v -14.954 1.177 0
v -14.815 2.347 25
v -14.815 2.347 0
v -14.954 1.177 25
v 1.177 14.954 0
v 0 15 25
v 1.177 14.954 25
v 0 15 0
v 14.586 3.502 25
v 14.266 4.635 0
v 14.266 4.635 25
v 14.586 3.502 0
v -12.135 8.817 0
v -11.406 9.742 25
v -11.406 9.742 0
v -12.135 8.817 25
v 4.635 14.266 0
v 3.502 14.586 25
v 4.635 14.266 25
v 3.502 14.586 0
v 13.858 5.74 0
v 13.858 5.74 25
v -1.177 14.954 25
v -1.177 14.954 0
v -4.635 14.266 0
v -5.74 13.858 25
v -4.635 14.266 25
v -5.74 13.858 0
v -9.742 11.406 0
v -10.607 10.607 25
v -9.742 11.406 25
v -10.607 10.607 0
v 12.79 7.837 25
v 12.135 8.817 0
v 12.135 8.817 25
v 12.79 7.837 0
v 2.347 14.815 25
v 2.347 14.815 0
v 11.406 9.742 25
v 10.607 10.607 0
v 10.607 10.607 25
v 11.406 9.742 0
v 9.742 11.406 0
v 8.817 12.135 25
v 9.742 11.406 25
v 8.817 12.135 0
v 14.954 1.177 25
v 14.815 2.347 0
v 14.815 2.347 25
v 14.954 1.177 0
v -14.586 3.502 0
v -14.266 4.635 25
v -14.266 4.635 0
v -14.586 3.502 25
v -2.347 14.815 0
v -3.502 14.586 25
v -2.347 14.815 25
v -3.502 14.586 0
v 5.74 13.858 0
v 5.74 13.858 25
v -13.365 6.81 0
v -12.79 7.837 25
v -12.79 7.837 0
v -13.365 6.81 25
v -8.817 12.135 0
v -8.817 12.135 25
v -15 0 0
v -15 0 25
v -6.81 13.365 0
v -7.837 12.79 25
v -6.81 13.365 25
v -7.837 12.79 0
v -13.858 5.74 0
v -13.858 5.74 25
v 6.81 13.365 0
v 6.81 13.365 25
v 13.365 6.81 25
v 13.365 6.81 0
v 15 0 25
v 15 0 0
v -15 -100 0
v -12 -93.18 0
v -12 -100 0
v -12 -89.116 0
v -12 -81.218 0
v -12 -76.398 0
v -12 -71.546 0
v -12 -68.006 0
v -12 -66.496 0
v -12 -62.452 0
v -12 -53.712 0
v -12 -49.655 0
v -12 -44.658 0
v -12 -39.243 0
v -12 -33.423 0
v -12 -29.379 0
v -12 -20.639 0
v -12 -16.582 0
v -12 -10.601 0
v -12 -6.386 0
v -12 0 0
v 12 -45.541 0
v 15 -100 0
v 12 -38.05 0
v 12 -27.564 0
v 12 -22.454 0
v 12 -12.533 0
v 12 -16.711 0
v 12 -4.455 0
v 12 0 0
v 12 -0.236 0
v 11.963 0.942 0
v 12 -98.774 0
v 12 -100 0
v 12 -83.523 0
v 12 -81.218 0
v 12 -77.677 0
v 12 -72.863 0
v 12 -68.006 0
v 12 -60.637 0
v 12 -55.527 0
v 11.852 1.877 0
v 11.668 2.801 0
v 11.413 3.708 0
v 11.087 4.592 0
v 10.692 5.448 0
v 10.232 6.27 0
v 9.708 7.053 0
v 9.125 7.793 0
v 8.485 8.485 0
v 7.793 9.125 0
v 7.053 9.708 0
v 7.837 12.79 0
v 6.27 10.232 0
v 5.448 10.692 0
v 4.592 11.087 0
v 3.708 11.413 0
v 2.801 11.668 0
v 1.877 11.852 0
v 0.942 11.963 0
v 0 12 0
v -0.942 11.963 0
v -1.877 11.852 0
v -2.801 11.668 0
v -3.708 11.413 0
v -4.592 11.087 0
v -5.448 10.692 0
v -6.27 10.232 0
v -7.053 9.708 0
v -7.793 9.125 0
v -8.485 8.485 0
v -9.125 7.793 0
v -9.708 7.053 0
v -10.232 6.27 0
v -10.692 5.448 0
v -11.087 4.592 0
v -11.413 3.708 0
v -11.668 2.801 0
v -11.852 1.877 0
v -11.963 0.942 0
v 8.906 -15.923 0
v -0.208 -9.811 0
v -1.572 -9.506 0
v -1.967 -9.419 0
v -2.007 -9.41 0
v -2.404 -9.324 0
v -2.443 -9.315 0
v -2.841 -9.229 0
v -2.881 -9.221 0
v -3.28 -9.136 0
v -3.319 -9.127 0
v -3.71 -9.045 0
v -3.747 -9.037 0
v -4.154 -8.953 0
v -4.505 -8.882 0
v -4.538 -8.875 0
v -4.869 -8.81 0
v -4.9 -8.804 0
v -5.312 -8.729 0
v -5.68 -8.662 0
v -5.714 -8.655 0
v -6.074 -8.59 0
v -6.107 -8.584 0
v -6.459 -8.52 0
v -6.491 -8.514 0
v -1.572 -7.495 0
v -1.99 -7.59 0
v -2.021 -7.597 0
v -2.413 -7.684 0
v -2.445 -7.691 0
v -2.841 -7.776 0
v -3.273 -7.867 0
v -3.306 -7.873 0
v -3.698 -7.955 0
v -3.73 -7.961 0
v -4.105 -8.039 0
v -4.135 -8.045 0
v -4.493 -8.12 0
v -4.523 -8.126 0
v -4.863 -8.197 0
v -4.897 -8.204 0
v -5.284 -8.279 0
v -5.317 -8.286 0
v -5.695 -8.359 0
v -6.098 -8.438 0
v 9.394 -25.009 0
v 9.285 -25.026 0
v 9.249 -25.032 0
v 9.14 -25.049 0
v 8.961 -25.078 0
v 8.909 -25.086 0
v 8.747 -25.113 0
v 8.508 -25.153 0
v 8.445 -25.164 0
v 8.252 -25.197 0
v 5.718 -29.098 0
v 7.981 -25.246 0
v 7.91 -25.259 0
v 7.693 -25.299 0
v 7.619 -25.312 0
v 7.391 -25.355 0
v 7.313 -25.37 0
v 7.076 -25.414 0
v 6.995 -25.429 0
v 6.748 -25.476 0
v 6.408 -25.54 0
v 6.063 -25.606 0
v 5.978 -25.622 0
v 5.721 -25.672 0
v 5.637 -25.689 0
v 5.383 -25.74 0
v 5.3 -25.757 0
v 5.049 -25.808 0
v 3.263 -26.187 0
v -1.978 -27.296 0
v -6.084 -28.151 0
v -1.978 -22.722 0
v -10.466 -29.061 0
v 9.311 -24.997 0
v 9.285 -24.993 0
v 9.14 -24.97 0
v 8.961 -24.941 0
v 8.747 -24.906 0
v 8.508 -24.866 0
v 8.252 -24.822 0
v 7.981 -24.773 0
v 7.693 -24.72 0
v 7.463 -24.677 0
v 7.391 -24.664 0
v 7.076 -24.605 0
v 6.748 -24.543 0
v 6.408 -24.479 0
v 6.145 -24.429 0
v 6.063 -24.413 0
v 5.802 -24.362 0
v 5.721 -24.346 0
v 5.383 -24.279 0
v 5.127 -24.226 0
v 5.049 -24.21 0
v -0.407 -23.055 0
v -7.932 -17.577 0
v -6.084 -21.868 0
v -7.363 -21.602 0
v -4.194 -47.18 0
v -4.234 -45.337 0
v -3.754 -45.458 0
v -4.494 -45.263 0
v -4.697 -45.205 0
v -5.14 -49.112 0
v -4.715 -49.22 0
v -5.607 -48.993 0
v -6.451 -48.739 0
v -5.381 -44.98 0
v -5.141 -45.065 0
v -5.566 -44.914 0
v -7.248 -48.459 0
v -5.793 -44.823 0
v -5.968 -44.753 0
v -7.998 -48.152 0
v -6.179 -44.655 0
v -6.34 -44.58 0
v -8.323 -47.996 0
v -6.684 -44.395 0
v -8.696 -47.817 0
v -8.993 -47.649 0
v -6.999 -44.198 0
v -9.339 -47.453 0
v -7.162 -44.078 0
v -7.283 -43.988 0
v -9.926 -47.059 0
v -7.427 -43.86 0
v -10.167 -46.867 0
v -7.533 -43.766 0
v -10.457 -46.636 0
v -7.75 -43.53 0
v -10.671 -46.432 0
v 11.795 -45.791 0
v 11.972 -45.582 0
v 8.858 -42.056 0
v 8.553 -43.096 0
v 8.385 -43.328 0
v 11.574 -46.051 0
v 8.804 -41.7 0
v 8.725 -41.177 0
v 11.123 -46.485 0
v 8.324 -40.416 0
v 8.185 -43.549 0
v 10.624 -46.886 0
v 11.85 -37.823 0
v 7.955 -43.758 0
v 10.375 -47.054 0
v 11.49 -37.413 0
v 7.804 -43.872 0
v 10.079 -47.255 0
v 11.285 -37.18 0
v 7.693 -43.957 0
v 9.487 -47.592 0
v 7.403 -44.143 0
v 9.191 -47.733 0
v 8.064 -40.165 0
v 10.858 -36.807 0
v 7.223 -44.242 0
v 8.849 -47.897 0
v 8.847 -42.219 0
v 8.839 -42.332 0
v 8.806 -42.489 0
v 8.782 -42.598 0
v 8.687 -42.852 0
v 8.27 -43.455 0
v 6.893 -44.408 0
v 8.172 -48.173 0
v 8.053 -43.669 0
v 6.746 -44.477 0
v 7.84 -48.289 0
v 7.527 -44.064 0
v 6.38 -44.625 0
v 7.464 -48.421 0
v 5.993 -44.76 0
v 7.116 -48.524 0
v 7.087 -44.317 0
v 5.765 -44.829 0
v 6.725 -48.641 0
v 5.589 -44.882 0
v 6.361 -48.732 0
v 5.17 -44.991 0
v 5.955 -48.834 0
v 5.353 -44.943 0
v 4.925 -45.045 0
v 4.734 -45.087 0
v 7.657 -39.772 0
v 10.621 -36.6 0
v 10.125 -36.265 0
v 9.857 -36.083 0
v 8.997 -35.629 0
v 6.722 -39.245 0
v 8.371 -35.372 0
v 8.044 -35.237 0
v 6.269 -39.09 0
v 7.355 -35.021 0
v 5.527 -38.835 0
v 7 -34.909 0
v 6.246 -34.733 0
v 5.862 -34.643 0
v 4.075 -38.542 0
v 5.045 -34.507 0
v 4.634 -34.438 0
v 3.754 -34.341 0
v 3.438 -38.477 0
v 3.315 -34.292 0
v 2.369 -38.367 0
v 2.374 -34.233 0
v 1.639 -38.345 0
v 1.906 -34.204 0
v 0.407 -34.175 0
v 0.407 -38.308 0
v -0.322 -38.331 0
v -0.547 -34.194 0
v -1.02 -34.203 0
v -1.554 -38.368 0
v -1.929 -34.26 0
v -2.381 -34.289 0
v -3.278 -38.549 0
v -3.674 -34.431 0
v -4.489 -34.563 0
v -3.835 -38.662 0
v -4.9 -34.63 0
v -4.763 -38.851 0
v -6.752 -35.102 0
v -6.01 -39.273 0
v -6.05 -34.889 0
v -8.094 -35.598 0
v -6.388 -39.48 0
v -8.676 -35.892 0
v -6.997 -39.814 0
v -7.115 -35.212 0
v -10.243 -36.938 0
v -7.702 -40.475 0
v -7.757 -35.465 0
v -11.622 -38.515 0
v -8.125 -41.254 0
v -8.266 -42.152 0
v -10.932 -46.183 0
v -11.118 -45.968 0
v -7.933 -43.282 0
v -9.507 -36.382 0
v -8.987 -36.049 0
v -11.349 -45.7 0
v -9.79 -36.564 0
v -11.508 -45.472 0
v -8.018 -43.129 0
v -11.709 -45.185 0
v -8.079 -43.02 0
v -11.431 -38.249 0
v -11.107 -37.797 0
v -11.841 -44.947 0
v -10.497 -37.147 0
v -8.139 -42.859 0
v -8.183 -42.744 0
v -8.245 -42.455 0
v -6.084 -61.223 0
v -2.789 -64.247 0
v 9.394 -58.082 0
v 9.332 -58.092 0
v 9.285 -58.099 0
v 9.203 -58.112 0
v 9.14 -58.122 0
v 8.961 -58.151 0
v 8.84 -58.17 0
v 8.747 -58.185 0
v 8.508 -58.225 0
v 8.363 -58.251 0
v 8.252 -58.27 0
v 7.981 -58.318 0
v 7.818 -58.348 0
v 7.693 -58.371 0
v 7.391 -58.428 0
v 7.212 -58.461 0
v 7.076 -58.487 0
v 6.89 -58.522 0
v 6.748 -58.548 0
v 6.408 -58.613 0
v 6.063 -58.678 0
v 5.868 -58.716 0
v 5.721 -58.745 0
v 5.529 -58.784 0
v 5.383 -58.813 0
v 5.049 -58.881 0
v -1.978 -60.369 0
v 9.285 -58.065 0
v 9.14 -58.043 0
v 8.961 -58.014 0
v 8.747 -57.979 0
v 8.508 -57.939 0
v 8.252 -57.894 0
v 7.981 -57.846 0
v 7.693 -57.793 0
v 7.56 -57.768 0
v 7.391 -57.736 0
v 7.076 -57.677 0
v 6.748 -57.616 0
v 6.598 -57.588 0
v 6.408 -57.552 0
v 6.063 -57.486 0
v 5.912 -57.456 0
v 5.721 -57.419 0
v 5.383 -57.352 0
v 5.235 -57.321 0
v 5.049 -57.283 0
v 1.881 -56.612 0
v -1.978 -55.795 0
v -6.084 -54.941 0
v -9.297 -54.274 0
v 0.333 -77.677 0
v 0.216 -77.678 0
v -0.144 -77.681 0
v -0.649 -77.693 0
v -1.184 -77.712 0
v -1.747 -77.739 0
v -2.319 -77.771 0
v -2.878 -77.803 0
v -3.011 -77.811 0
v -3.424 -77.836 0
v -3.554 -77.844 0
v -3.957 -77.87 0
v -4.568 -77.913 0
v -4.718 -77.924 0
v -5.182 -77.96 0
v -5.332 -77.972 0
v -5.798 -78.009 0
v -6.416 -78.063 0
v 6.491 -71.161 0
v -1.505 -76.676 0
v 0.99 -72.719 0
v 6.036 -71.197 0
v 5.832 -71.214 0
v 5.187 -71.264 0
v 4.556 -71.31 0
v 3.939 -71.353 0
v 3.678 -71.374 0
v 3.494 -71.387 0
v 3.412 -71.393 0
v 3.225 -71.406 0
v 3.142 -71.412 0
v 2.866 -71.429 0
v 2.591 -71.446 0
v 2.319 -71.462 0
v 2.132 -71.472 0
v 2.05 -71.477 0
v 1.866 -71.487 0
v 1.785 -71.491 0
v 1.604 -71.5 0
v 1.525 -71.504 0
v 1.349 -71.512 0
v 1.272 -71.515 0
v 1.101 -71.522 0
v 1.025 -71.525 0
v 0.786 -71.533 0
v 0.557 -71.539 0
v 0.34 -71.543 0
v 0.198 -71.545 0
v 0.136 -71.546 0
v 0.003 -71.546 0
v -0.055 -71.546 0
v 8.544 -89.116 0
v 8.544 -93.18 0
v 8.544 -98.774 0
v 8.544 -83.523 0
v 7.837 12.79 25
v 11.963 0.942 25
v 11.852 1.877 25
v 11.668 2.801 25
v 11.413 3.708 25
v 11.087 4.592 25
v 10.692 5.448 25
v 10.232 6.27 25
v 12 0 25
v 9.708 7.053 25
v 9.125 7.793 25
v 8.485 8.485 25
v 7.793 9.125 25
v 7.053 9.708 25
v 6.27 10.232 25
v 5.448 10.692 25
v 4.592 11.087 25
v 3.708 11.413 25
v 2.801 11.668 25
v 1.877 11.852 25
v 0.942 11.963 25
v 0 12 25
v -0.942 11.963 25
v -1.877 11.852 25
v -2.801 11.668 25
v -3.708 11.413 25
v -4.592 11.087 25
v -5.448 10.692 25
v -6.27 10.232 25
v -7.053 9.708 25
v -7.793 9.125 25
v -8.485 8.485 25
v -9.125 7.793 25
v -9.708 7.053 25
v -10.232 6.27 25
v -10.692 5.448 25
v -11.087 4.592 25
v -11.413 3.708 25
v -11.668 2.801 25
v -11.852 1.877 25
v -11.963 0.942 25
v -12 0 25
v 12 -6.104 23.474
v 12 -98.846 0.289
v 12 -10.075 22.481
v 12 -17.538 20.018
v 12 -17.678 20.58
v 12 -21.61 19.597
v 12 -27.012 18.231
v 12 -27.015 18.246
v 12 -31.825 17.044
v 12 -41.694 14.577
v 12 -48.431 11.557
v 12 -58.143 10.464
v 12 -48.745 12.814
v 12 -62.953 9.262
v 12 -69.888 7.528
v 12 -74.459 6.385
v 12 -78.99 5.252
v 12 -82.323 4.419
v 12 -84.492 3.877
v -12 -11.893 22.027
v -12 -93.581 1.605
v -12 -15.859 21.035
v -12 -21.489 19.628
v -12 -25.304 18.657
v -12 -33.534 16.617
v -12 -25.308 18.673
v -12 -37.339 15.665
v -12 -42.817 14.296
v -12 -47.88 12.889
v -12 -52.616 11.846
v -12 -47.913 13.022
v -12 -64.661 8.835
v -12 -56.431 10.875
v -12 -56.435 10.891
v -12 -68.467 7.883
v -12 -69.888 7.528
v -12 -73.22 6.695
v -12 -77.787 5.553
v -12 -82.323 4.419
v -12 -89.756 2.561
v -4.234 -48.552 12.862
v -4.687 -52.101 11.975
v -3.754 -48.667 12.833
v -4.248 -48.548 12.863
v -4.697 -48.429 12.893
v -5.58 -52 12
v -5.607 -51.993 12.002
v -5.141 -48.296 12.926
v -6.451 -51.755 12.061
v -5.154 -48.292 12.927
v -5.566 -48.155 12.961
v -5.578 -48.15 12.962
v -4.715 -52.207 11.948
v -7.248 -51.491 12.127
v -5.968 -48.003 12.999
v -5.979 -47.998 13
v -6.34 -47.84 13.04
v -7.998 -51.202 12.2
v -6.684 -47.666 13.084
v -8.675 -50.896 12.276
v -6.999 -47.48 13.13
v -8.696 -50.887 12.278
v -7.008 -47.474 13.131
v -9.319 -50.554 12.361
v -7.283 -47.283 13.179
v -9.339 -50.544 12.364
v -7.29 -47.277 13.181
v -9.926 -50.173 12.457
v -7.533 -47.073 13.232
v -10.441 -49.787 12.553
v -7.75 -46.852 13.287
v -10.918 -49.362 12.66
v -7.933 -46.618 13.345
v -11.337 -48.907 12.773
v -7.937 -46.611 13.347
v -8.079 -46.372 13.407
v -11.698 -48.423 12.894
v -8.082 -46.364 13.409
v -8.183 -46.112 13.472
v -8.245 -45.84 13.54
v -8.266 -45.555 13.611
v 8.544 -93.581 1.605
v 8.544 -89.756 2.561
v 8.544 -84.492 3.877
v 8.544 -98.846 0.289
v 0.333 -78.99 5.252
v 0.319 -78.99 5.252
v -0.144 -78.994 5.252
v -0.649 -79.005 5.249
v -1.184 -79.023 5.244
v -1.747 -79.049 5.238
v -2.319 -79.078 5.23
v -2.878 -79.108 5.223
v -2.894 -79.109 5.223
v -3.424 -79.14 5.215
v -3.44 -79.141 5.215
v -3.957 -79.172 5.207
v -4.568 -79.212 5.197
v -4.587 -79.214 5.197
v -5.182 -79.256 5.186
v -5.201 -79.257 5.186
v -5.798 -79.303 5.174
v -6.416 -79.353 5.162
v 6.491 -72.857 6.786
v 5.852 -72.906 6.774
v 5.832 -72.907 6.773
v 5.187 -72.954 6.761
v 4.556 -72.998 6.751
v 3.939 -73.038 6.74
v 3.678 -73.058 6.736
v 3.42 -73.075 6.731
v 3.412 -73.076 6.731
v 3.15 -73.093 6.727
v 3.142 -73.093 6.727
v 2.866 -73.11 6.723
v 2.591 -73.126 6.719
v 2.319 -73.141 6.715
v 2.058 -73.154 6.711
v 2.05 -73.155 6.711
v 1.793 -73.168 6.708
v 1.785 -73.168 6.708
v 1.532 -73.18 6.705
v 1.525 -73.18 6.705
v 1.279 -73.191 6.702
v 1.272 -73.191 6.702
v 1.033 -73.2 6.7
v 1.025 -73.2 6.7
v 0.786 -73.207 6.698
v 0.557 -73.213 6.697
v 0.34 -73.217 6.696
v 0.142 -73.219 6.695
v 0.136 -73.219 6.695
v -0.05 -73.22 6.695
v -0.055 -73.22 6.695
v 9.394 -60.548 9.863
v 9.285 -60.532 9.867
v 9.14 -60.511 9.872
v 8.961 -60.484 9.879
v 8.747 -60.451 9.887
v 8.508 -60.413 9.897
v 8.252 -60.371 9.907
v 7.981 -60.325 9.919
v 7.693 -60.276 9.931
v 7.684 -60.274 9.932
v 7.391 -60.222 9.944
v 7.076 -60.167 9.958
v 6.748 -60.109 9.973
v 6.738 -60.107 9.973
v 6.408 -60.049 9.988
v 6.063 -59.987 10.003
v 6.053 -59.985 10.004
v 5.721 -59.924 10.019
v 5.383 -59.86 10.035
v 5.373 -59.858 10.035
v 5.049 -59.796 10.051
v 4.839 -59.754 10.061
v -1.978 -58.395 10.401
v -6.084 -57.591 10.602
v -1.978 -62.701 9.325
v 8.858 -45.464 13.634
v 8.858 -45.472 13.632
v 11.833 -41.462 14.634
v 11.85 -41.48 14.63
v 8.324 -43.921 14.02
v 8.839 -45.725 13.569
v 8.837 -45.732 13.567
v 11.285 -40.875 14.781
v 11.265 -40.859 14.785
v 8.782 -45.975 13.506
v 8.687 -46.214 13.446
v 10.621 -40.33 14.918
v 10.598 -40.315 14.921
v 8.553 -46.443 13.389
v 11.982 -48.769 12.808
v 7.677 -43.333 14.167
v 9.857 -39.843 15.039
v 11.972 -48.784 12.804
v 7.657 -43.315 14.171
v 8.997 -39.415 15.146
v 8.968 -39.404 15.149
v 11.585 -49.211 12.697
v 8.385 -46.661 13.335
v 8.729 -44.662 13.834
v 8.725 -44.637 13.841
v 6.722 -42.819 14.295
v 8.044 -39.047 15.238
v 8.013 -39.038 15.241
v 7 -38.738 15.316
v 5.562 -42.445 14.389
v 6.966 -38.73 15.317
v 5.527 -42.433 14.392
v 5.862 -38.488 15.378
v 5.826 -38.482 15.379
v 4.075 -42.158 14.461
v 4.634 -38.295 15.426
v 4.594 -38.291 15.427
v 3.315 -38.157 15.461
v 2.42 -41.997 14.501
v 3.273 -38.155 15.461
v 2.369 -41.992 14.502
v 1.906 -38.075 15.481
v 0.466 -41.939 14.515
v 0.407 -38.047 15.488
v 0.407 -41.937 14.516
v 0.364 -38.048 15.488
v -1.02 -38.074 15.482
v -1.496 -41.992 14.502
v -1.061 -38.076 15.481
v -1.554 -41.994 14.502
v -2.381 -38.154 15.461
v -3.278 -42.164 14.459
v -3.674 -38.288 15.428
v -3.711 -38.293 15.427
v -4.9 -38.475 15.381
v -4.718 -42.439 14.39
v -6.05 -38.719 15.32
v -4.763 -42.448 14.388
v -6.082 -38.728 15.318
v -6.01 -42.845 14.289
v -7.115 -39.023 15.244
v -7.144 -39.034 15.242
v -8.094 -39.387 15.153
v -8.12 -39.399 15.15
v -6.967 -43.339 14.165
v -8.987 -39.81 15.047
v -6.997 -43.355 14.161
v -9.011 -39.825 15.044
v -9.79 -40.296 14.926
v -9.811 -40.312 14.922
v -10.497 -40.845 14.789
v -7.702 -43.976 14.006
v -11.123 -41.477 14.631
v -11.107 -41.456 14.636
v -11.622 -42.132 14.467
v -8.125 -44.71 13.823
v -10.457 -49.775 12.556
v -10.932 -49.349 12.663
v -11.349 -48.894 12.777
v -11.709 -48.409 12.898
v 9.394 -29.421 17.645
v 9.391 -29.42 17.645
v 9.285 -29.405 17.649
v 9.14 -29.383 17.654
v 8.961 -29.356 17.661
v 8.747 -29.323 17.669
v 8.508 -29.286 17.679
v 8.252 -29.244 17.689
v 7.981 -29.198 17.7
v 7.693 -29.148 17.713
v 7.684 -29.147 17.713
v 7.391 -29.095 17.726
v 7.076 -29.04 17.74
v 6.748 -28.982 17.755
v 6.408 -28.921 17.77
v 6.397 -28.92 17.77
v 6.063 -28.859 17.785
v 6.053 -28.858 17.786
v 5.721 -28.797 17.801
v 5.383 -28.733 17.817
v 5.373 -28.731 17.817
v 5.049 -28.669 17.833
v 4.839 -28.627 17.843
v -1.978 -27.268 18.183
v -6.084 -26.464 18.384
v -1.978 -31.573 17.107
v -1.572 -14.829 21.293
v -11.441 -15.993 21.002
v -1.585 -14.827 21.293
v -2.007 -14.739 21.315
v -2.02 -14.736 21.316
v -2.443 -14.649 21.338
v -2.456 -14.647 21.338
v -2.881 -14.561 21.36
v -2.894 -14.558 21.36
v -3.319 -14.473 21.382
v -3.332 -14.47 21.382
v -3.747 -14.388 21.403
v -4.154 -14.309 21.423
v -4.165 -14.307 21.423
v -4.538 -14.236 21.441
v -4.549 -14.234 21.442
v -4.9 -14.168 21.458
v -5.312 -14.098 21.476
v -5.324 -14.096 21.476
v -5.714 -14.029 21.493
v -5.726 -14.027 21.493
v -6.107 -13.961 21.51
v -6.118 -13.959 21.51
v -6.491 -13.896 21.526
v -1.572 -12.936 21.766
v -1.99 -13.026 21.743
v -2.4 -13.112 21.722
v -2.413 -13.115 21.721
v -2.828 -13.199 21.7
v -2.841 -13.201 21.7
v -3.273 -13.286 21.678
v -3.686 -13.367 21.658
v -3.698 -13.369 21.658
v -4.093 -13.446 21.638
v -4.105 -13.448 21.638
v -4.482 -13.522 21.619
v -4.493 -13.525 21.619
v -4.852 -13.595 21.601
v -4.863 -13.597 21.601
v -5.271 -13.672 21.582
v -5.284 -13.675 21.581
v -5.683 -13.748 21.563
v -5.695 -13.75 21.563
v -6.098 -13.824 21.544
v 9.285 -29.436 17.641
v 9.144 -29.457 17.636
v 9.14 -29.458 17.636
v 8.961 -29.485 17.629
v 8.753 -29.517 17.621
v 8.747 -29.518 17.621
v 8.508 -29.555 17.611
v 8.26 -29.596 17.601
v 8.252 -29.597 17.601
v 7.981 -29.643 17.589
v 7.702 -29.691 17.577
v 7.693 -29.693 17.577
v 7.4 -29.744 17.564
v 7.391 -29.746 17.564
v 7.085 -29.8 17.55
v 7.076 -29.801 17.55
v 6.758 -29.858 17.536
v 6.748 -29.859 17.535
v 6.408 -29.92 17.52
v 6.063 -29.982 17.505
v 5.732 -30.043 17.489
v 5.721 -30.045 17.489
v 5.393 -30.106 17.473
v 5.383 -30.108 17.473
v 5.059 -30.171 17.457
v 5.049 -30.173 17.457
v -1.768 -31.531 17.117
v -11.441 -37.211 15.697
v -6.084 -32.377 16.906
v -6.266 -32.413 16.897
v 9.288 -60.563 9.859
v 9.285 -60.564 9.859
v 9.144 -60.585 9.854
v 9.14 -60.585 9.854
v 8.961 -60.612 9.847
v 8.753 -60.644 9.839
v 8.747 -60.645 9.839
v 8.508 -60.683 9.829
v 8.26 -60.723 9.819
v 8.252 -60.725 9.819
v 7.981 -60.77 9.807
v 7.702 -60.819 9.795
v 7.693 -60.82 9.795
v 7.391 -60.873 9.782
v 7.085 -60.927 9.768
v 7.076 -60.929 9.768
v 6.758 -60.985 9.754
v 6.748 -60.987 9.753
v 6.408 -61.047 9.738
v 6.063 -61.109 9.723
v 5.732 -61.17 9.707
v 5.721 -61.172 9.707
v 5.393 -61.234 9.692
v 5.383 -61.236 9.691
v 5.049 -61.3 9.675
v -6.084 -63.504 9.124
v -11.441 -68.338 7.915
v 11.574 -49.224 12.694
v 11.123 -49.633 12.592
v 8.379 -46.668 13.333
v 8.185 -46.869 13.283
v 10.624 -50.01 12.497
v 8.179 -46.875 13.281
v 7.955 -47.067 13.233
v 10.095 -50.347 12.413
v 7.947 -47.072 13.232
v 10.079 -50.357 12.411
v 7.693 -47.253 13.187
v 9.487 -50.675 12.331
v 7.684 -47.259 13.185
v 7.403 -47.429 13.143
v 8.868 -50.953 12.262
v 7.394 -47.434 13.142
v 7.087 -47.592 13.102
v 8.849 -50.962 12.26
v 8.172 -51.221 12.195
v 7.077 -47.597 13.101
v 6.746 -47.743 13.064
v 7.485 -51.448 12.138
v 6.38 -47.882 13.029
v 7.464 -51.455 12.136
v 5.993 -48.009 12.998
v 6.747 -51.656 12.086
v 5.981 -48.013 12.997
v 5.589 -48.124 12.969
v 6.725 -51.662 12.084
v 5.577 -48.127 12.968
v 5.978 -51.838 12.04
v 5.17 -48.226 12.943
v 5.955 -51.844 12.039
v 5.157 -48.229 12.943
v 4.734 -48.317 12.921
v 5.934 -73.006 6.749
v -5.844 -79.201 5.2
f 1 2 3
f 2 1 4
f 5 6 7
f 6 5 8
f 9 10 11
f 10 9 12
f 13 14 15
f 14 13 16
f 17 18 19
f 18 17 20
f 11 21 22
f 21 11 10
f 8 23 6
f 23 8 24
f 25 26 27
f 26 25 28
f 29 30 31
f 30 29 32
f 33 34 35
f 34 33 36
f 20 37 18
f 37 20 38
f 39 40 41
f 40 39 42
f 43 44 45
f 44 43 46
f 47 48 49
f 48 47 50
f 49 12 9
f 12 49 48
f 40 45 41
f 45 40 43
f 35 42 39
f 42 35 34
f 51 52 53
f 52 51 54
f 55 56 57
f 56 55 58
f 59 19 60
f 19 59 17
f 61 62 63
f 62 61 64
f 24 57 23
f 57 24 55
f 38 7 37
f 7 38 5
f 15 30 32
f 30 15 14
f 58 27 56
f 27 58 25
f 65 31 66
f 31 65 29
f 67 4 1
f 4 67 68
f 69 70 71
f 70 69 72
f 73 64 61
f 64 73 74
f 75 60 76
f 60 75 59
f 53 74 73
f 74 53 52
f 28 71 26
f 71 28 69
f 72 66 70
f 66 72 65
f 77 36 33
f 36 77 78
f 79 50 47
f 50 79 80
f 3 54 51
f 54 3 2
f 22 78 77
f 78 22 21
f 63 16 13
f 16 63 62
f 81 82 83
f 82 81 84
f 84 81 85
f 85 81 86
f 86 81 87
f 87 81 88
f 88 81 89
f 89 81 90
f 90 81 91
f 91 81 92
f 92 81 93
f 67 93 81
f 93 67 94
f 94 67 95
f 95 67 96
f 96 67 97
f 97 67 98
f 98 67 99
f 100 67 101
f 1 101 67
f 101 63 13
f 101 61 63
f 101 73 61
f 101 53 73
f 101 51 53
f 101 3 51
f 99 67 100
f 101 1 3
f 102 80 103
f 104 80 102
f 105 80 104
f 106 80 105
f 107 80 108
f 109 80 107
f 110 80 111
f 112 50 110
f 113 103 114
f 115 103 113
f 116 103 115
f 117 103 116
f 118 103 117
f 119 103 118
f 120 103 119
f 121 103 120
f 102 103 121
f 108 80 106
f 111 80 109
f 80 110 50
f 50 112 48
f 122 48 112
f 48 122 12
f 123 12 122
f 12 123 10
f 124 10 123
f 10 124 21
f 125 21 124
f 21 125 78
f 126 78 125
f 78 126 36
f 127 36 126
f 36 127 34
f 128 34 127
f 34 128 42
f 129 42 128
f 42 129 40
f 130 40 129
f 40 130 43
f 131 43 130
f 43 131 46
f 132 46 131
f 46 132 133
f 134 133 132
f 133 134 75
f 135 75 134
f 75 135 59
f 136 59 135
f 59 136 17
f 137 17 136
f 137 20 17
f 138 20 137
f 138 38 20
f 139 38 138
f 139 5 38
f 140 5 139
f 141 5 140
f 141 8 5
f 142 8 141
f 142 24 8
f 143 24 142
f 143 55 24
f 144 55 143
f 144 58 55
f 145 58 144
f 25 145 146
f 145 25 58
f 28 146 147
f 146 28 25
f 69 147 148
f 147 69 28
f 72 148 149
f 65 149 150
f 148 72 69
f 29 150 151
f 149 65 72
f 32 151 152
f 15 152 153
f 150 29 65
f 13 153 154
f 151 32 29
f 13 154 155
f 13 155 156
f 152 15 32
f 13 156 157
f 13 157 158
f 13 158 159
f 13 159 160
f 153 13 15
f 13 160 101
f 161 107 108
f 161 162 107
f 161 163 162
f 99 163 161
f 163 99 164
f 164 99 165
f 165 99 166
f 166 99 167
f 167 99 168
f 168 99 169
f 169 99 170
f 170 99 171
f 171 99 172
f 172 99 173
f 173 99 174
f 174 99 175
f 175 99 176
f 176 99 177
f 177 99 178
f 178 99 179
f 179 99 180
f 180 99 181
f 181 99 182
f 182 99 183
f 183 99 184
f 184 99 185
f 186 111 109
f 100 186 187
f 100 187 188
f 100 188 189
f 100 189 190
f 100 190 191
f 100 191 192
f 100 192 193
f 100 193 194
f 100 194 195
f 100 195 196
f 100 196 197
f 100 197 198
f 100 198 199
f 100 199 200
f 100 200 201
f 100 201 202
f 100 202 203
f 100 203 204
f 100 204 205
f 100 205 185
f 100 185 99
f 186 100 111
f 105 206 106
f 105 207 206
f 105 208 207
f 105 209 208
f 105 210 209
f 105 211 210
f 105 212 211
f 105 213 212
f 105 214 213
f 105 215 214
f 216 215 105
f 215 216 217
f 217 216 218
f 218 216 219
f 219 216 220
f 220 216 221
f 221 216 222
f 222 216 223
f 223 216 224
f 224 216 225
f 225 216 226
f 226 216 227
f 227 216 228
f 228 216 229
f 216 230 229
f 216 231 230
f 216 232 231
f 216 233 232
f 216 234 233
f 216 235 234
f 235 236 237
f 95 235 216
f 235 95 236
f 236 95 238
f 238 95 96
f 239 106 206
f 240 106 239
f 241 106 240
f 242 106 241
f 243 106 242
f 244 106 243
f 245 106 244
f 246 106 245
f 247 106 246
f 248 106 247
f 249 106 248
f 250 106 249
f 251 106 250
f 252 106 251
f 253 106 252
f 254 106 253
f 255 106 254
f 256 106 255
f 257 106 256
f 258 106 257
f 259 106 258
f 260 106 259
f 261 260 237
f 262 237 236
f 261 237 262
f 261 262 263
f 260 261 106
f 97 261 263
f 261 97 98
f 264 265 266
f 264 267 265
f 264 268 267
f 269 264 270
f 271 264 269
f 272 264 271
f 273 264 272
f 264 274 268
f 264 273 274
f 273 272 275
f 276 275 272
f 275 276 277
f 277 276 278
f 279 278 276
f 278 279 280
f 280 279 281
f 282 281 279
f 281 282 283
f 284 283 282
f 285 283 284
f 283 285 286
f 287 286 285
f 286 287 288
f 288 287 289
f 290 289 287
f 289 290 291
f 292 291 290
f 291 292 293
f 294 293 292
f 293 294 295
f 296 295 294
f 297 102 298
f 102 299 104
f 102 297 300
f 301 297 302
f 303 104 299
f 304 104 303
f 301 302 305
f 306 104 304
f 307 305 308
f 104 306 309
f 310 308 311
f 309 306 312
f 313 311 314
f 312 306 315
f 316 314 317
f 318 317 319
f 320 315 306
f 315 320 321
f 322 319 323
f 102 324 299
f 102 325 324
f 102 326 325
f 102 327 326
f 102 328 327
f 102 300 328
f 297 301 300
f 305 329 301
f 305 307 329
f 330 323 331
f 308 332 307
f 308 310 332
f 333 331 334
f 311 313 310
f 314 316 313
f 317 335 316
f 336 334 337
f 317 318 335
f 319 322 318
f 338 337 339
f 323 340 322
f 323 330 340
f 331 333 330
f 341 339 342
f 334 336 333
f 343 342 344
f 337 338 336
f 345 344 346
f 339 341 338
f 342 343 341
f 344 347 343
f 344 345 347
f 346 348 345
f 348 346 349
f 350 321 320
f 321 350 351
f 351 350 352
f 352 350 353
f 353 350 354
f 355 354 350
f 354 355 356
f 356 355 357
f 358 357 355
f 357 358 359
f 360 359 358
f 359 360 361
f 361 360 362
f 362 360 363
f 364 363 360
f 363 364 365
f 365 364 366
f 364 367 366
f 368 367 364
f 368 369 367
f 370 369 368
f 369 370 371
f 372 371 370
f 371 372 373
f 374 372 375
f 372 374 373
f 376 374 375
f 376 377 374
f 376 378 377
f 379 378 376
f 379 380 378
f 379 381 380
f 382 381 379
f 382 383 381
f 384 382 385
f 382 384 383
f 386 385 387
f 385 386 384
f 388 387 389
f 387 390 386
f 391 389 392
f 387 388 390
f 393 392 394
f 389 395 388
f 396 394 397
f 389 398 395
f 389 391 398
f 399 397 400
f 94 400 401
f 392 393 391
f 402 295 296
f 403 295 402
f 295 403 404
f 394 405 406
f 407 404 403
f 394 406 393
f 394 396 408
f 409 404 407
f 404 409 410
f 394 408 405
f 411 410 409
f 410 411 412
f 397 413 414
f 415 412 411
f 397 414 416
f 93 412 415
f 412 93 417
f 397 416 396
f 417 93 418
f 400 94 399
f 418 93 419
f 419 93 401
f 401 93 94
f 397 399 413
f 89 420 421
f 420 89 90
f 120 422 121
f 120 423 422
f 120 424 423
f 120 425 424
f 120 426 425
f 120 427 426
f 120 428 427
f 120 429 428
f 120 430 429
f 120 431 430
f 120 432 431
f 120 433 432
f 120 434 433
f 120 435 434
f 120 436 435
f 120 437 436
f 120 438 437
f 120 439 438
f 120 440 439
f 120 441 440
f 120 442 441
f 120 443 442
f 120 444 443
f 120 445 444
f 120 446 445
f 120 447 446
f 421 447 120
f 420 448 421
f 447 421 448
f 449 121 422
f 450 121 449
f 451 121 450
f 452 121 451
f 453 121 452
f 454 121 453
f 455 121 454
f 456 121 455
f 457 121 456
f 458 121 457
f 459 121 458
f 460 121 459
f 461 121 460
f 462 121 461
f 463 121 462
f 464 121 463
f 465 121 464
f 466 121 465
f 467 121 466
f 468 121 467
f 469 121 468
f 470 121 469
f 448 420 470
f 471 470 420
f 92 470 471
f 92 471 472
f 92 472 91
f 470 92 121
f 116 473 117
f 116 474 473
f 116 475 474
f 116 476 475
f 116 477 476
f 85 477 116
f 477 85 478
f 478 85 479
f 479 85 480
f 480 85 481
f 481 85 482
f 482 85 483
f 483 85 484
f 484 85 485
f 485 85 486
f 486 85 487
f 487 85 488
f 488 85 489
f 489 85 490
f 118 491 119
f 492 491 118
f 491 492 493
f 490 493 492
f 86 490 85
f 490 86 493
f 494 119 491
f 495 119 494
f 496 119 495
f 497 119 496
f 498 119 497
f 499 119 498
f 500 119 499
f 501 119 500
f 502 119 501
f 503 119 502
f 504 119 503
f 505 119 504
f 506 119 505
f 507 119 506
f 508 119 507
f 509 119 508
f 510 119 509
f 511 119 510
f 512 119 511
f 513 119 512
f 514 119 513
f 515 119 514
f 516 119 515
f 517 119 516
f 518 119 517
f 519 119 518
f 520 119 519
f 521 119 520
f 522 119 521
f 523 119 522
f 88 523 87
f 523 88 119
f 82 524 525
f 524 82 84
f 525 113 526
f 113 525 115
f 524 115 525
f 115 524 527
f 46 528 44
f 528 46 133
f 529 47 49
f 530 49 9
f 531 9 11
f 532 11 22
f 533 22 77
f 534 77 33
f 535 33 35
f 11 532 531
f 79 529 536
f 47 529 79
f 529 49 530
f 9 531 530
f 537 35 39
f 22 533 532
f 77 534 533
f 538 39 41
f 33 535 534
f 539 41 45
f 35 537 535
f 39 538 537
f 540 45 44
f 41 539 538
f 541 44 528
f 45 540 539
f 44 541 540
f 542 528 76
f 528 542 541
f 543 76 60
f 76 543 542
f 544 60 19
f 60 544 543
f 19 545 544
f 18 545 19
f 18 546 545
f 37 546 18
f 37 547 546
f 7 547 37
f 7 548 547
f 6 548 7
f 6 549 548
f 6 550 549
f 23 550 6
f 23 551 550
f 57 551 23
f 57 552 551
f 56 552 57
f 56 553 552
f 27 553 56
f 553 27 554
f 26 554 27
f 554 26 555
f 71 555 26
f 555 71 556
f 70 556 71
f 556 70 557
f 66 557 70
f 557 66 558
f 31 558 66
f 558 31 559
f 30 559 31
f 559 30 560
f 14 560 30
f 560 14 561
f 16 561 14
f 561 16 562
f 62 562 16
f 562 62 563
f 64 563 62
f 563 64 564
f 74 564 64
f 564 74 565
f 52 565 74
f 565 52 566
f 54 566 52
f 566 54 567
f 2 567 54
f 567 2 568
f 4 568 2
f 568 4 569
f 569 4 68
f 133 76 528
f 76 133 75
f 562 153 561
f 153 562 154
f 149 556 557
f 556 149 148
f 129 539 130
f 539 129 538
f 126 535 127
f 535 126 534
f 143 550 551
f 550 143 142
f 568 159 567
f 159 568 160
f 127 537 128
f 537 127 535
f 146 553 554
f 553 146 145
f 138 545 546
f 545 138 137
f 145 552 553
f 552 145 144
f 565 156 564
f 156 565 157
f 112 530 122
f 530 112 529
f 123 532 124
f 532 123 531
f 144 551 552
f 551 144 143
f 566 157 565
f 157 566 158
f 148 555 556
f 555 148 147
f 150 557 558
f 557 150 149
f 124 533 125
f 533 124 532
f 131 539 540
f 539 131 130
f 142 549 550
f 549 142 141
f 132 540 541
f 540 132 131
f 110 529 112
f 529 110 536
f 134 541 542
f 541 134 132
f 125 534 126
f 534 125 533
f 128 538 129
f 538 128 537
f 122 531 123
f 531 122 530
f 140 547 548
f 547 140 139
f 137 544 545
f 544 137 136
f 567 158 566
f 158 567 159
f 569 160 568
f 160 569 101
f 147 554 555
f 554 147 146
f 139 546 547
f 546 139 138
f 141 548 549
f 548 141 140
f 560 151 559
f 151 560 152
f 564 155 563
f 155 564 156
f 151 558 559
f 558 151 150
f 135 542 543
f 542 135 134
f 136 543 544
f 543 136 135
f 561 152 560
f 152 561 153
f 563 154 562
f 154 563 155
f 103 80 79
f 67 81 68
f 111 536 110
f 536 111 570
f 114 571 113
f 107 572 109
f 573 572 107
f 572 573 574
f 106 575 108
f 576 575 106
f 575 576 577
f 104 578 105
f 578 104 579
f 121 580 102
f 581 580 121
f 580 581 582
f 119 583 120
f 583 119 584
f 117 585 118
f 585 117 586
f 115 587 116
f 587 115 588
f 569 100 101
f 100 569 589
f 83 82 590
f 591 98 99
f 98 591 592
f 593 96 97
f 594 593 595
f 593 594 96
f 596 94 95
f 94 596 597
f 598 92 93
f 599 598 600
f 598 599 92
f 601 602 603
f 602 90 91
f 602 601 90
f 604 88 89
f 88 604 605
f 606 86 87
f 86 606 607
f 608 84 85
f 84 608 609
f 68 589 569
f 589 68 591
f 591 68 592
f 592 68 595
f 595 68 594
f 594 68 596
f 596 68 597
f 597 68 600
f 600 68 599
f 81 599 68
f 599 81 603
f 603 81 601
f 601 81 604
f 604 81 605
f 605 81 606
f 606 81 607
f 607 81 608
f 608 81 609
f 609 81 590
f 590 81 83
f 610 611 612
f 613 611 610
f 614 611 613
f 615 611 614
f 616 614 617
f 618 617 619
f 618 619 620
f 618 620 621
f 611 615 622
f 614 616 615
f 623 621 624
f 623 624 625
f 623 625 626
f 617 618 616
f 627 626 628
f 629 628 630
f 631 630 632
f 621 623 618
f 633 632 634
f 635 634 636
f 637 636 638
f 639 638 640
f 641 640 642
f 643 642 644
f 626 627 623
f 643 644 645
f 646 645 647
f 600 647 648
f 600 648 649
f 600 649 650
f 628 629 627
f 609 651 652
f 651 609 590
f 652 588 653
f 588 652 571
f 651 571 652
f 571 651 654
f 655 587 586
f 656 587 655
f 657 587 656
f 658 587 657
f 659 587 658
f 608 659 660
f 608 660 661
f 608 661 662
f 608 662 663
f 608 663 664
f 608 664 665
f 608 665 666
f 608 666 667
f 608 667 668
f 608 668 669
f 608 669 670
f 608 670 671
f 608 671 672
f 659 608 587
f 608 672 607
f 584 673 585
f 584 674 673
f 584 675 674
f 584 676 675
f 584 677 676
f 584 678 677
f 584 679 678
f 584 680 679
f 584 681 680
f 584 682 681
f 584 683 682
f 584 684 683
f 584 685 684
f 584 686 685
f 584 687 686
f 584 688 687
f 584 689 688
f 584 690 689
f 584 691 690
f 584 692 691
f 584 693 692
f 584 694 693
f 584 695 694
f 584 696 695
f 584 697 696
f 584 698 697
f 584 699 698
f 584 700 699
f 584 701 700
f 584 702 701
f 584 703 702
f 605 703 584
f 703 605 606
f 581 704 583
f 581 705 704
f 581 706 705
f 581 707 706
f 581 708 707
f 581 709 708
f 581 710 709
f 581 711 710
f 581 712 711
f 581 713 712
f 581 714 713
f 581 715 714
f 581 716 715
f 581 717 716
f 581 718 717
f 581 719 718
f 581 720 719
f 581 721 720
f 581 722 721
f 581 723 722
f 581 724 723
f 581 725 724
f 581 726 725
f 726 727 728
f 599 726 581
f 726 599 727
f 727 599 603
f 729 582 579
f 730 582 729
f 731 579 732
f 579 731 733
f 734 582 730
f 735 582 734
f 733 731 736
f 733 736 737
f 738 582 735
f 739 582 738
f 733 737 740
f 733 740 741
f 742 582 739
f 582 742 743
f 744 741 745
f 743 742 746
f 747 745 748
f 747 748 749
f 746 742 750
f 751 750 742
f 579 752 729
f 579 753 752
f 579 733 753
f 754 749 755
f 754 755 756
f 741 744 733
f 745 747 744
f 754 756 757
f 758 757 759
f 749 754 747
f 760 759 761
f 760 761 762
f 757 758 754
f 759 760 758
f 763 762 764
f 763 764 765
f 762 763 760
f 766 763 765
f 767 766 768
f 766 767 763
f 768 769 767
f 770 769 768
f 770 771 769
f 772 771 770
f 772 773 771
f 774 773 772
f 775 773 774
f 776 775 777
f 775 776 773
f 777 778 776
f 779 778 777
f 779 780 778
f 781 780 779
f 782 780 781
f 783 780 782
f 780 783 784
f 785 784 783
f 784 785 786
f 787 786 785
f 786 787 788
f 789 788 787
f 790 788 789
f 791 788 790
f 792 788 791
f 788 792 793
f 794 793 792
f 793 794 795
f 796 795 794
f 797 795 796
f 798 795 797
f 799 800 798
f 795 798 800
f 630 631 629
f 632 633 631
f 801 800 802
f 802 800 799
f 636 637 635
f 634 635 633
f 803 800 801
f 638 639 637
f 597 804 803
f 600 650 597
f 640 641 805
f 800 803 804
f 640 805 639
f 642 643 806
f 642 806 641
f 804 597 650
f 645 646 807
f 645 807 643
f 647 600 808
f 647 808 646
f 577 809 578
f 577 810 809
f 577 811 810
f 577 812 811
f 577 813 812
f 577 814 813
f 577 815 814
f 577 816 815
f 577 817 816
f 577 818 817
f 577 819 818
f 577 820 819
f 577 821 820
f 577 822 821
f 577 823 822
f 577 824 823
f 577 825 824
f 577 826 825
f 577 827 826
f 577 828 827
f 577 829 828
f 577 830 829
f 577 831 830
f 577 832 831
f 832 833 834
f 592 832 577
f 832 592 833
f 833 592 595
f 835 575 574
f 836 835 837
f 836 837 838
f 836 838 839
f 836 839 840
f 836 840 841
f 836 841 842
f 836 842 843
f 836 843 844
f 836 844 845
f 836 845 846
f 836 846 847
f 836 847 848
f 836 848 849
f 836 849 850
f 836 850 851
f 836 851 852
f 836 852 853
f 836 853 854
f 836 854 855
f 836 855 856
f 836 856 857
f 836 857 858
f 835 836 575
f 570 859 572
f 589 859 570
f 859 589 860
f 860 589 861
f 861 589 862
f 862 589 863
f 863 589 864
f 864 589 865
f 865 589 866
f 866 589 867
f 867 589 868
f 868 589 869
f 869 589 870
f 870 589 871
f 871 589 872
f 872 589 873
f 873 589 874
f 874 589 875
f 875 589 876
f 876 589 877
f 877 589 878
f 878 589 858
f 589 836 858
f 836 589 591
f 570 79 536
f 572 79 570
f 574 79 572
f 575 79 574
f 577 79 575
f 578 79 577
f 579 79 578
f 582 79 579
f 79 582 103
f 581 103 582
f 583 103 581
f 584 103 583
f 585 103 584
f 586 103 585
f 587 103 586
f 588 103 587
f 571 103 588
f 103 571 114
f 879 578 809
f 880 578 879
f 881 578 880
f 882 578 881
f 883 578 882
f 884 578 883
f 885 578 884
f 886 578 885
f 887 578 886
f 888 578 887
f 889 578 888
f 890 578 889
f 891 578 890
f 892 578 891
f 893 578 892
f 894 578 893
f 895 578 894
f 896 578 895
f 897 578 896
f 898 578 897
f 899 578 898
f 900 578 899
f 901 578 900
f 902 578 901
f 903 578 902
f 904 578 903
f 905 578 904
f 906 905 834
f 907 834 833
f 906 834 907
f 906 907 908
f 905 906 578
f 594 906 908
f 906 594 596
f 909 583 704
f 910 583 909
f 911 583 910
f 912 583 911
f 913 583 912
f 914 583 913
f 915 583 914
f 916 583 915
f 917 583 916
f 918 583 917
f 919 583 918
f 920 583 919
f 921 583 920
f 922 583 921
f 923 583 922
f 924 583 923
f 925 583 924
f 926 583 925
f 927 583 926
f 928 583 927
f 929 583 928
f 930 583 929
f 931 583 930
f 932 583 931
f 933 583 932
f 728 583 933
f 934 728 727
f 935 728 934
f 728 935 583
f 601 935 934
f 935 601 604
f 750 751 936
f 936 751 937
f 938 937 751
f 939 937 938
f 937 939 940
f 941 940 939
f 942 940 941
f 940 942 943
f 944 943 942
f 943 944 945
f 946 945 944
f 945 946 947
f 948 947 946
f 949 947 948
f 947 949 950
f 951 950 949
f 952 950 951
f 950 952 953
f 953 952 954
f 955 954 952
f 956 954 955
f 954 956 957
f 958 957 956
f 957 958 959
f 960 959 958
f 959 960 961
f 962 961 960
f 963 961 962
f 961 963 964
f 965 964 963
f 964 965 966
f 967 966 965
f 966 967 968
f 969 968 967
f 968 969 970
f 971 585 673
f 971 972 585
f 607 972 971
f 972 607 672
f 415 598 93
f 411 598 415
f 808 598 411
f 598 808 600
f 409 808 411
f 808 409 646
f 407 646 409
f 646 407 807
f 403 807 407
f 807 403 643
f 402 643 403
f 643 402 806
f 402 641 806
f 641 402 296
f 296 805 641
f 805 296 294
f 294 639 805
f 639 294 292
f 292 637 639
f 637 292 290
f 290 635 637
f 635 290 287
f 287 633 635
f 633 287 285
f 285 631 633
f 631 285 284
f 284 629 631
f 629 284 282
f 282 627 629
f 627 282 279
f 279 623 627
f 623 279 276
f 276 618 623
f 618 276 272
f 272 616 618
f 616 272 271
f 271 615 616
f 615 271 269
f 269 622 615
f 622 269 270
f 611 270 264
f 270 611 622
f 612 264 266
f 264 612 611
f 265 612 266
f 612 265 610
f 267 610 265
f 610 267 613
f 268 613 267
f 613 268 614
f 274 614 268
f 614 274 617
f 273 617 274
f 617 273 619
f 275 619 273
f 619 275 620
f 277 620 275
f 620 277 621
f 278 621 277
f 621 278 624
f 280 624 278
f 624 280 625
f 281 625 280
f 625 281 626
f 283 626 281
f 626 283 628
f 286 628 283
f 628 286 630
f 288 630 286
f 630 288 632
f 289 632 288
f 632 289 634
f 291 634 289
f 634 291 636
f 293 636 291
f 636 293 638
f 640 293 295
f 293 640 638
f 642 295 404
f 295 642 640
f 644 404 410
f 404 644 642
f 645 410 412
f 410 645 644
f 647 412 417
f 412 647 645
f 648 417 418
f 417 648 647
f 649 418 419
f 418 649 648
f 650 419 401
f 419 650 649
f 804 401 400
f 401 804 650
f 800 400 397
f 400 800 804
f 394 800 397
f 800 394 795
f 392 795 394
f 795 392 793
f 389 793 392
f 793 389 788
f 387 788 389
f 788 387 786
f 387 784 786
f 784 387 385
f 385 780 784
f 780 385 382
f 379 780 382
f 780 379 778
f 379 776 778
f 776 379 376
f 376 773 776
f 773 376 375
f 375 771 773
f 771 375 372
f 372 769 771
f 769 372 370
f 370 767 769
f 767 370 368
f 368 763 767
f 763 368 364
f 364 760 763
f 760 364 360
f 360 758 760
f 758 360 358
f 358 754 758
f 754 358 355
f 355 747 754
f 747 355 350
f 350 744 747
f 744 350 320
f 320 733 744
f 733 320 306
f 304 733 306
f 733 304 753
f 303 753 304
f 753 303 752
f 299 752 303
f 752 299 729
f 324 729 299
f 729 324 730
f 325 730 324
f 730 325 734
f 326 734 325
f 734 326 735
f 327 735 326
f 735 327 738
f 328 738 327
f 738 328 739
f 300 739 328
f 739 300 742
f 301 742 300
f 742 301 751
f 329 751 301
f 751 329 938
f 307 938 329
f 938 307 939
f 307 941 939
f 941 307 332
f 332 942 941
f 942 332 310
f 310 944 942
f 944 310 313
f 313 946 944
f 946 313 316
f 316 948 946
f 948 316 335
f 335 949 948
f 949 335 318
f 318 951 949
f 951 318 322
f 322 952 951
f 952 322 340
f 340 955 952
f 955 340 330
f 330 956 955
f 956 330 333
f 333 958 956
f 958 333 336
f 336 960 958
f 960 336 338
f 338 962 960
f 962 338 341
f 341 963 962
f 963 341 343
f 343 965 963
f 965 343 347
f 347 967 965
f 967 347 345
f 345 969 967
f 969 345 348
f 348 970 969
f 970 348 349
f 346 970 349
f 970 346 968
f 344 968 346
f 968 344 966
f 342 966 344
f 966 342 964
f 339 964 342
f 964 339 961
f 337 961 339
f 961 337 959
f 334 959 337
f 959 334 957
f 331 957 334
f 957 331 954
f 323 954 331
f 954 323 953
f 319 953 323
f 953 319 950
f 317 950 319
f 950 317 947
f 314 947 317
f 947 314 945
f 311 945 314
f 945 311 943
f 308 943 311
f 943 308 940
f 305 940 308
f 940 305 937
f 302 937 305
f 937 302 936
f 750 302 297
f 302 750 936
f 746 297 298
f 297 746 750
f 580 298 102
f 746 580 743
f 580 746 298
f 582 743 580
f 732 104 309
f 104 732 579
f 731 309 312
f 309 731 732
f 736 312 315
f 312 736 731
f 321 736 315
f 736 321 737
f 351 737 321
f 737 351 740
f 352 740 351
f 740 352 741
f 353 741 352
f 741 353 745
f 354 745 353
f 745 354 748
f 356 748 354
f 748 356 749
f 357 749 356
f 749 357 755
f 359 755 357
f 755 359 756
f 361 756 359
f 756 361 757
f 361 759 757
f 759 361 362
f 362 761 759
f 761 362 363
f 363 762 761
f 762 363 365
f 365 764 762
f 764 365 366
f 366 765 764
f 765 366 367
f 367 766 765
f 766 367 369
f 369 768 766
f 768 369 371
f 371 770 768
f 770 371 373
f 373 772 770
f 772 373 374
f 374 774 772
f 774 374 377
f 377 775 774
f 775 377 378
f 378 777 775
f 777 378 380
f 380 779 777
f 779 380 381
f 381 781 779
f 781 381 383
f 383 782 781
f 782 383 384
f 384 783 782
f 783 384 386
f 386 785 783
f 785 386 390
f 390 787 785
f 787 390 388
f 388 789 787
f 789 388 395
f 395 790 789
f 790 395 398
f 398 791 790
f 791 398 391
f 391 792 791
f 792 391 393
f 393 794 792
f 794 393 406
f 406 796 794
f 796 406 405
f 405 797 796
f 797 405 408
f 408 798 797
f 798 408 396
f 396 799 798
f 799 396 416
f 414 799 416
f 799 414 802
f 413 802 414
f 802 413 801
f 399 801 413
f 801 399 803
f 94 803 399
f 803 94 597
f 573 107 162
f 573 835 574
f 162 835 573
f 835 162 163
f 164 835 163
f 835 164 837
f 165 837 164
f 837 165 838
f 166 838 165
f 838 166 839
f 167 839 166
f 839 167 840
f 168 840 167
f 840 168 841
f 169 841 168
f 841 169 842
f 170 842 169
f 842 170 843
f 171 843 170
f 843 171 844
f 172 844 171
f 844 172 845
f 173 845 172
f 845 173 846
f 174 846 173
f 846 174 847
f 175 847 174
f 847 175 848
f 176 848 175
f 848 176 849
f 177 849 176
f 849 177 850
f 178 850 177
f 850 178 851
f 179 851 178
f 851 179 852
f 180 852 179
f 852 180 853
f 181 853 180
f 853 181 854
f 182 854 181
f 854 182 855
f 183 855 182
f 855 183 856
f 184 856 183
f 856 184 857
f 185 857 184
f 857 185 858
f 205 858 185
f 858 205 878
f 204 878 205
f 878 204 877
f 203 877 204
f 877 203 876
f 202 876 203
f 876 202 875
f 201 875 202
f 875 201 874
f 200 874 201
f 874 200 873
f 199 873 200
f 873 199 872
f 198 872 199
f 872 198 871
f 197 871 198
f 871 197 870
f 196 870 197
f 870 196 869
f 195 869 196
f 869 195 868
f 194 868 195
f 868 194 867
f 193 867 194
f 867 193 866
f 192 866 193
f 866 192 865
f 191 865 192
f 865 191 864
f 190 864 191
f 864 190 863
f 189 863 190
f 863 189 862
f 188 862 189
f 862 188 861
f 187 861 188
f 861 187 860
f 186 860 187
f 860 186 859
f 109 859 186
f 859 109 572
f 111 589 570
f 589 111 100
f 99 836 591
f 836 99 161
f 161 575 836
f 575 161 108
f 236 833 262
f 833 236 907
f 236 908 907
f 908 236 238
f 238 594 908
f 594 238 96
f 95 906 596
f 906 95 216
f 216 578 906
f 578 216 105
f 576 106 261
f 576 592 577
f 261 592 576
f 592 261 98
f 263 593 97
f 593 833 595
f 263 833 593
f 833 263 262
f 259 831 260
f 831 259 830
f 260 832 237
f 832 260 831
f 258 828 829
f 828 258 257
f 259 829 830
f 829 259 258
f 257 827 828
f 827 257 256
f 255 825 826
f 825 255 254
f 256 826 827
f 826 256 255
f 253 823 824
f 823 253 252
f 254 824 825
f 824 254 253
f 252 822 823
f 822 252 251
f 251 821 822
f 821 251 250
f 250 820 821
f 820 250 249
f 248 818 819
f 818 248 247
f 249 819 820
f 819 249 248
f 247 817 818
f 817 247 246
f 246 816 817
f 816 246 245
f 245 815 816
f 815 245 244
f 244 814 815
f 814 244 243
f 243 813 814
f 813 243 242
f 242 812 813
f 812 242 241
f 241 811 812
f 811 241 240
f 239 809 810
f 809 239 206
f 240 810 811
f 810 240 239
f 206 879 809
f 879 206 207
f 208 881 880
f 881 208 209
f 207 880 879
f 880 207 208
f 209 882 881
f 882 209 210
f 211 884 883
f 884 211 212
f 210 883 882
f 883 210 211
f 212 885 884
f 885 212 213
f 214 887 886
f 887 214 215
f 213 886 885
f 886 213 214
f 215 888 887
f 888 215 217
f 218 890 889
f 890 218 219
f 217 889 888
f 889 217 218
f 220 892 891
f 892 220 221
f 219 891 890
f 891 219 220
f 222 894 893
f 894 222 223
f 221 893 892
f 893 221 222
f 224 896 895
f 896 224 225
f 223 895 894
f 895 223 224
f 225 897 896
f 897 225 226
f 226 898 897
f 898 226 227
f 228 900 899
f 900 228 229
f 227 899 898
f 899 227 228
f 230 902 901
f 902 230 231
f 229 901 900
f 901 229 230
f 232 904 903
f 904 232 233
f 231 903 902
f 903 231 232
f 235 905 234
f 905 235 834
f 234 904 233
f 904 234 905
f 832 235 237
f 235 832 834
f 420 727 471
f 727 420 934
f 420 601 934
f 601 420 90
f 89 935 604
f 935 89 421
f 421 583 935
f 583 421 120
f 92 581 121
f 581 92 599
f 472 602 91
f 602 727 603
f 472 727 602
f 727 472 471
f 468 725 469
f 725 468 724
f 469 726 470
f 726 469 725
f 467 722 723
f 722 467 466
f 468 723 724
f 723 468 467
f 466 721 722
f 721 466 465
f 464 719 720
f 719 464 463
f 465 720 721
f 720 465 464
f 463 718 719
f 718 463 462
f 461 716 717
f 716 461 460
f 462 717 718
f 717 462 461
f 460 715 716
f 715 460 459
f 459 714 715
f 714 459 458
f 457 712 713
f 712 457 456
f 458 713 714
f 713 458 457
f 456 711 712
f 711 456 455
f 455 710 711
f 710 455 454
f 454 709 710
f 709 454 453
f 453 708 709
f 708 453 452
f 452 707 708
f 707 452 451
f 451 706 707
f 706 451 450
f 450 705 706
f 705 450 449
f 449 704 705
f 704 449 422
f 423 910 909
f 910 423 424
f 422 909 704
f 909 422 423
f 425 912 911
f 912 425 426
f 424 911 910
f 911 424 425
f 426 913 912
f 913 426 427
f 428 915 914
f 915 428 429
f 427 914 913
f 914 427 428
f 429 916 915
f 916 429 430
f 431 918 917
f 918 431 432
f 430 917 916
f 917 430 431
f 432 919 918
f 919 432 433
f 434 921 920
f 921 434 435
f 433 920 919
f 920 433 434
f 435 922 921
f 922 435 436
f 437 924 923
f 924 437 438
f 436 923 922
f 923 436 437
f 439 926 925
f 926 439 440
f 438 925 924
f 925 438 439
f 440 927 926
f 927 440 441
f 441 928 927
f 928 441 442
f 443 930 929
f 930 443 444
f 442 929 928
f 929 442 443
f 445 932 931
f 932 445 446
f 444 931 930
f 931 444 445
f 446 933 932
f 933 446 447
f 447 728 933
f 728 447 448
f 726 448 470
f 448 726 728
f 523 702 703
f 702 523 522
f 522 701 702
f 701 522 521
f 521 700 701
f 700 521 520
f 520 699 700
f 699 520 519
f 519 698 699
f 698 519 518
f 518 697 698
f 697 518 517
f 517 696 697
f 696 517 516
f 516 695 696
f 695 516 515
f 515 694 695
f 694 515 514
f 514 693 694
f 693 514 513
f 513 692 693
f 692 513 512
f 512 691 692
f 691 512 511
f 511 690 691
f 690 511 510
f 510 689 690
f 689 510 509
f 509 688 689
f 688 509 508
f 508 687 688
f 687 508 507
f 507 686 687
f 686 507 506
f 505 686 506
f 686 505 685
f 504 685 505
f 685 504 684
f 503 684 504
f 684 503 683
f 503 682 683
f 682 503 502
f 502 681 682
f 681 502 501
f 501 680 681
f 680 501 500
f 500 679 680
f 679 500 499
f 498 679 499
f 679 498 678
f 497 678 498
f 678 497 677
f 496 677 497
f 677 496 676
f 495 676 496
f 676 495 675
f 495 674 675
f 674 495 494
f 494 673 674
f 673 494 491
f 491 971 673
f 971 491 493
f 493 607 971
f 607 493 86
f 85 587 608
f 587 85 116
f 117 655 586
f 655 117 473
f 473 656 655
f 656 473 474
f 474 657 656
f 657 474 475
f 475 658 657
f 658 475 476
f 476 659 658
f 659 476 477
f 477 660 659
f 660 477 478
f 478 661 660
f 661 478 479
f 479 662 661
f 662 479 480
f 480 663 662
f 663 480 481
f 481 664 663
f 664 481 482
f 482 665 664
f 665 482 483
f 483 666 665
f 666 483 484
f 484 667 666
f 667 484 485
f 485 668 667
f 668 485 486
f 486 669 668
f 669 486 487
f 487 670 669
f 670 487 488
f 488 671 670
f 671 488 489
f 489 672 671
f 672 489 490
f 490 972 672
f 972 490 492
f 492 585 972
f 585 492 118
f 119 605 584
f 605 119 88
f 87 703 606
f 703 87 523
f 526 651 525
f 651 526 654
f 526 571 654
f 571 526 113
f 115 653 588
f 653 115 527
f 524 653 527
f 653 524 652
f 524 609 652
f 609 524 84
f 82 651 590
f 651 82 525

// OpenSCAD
// Author: Neon22
// July 2018

// preview[view:south west, tilt:top diagonal]

/* [Parameters] */
Wedge_length = 100; // [50:300]
Wedge_width  = 30;  // [10:60]
Wedge_height = 25;  // [5:100]
Wall_thickness = 3; // [0.5:5]

/* [Text] */
Word       = "VACANT";
Word_font  = "Liberation Mono";
Word_style = "Bold"; // [Regular,Bold,Bold Italic,Italic,Condensed,Oblique,Extra Light]

/* [Adjust] */
// Adjust to fit the length
Word_stretch = 0.73;
// Adjust so word hits both sides.
Word_adjust  = 1.01; // [0.9:0.01:1.2]
// Tilt word so its flat on slope.
Tilt_word    = true;

/* [Hidden] */
word_angle = Tilt_word ? tilt() : 0;
font_description = str(Word_font,":style=",Word_style);
//
Delta = 0.1;
cyl_res = 80;

	
//----------------------
// what angle for slope - based on length
function tilt() = atan2(Wedge_height,Wedge_length);

// clip out the top of the wedge
module clip_angle() {
	translate([0,-Delta,Wedge_height/2])
	rotate([0,tilt(),0])
		cube(size=[Wedge_length*1.5,Wedge_width+Delta*2, Wedge_height*2]);
}

// clip excess text from the base
module clip_base() {
	translate([0,-Wedge_width,-Wedge_height*2.5])
		cube(size=[Wedge_length*1.5,Wedge_width*2+Delta*2, Wedge_height*2]);
}

module basic_wedge () {
	// round bit
	difference() {
		// outer cyl
		cylinder(r=Wedge_width/2, h=Wedge_height, $fn=cyl_res, center=true);
		// inner cyl
		cylinder(r=Wedge_width/2-Wall_thickness, h=Wedge_height+Delta*2, $fn=cyl_res, center=true);
		// cutoff RHS
		translate([0,-Wedge_width/2,-Wedge_height/2-Delta])
			cube(size=[Wedge_length,Wedge_width+Delta*2, Wedge_height+Delta*2]);
	}
	// long bit
	translate([0,-Wedge_width/2,-Wedge_height/2])
		difference() {
			// outer cube
			cube(size=[Wedge_length,Wedge_width,Wedge_height]);
			// inner cube
			translate([-Delta,Wall_thickness,-Delta])
				cube(size=[Wedge_length+Delta*2,Wedge_width-Wall_thickness*2,Wedge_height+Delta*2]);
			// angle clip
			translate([0,0,Wedge_height/2])
				clip_angle();
		}
}

// Text
module base_text(tilt=0) {
	translate([0,0,-Wedge_height/2])
	rotate([0,tilt,0])
	scale([Word_stretch,Word_adjust,1])
	linear_extrude(height=Wedge_height, convexity=4)
		text(Word, size=Wedge_width-Wall_thickness, valign="center", font=font_description);
}

module clipped_text() {
	difference() {
		base_text(word_angle);
		translate([0,-Wedge_width/2,0])
			clip_angle();
		clip_base();
	}
}

//---------------------
rotate([0,0,-90])
translate([0,0,Wedge_height/2]) {
	basic_wedge();
	clipped_text();
}
